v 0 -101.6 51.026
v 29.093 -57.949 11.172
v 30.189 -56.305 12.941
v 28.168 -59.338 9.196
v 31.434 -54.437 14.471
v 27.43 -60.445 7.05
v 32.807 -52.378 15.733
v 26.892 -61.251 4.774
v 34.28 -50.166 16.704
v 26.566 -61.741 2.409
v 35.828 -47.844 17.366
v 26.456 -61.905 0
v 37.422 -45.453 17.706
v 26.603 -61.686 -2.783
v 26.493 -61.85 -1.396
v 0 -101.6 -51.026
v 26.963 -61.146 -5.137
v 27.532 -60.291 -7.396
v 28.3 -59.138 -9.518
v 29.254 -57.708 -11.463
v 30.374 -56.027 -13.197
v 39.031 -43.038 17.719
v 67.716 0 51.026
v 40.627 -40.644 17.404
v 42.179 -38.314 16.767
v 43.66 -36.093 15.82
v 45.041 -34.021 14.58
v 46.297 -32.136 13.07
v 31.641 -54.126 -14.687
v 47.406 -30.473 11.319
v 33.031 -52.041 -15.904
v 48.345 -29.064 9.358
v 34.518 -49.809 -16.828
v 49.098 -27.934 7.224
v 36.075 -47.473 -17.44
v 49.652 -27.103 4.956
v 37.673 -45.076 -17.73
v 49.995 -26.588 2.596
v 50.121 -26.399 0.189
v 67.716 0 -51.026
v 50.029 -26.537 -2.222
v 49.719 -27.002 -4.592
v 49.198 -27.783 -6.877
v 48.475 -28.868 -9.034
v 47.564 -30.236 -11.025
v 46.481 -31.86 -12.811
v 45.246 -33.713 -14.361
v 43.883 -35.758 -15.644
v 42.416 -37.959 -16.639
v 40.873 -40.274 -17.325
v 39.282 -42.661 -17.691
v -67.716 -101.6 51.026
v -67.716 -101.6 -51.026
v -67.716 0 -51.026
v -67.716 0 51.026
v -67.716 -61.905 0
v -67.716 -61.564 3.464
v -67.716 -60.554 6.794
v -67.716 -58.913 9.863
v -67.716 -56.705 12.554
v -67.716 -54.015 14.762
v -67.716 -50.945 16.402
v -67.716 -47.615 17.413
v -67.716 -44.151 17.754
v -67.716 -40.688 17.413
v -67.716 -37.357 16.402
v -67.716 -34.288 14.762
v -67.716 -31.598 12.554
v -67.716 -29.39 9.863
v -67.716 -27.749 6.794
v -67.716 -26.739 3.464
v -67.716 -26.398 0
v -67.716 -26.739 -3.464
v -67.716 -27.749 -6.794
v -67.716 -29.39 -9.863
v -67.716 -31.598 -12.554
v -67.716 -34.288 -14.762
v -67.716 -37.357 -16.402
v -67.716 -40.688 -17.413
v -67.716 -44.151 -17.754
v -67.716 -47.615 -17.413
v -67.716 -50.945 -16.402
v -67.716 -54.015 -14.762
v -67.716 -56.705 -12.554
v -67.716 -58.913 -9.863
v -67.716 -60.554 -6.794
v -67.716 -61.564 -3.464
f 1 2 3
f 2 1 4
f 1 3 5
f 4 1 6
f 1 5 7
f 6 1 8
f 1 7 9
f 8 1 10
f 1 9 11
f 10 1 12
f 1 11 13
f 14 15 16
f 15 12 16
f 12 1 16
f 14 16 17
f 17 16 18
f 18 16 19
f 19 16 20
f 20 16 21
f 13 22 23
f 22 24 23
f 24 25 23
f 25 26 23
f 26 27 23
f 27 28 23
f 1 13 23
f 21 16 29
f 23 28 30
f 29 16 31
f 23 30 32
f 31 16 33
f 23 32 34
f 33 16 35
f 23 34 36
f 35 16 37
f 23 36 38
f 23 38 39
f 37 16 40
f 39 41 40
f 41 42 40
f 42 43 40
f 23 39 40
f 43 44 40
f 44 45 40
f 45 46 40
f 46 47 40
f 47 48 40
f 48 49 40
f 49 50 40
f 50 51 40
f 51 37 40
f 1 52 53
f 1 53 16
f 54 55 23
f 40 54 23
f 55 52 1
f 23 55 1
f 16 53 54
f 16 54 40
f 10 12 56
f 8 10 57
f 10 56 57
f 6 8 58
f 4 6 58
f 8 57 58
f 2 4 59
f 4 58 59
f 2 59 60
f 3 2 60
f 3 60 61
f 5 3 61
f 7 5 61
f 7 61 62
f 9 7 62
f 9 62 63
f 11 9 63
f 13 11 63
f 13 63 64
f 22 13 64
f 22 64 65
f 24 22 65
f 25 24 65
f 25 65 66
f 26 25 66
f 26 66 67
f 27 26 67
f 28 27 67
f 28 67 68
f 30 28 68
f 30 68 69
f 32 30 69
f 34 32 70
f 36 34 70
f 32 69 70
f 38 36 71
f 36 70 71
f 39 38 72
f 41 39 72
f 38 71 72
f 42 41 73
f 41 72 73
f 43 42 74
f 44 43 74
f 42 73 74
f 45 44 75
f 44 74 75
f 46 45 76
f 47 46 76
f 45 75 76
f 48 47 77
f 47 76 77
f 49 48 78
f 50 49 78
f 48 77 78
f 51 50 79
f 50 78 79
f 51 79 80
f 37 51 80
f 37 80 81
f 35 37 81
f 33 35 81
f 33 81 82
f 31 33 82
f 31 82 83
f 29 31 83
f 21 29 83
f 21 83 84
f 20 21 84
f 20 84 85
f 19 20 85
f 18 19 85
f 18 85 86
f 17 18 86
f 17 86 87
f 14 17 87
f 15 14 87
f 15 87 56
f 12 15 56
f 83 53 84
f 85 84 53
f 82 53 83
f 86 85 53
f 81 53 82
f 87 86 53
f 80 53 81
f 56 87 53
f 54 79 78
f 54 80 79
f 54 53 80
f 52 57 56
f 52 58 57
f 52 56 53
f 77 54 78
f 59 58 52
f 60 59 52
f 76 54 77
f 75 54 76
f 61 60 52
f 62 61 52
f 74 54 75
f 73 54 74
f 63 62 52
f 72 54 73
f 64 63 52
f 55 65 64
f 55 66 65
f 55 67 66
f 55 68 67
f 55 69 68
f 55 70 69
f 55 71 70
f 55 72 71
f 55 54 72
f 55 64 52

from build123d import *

# Parameters (mm, degrees)
F0_W     = 135.431692
F0_H     = 102.052846
F1_DEPTH = 101.6
F3_DEPTH = 102.053845
F4_R     = 17.753754
F5_DEPTH = 135.432692


with BuildPart() as f1:
    # F0 (on Front) → F1 (new body)
    with BuildSketch(Plane.XZ):
        Rectangle(F0_W, F0_H)
    extrude(amount=F1_DEPTH)

    # F2 (on face) → F3 (cut, through all)
    with BuildSketch(Plane(origin=(0, 0, -51.026423), x_dir=(1, 0, 0), z_dir=(0, 0, -1))):
        Polygon((67.715846, 0), (67.715846, 101.6), (0, 101.6), align=None)
    extrude(amount=-F3_DEPTH, mode=Mode.SUBTRACT)

    # F4 (on face) → F5 (cut, through all)
    with BuildSketch(Plane(origin=(-67.715846, 0, 0), x_dir=(0, -1, 0), z_dir=(-1, 0, 0))):
        with Locations((44.151351, 0)):
            Circle(F4_R)
    extrude(amount=-F5_DEPTH, mode=Mode.SUBTRACT)


solid = f1.part
